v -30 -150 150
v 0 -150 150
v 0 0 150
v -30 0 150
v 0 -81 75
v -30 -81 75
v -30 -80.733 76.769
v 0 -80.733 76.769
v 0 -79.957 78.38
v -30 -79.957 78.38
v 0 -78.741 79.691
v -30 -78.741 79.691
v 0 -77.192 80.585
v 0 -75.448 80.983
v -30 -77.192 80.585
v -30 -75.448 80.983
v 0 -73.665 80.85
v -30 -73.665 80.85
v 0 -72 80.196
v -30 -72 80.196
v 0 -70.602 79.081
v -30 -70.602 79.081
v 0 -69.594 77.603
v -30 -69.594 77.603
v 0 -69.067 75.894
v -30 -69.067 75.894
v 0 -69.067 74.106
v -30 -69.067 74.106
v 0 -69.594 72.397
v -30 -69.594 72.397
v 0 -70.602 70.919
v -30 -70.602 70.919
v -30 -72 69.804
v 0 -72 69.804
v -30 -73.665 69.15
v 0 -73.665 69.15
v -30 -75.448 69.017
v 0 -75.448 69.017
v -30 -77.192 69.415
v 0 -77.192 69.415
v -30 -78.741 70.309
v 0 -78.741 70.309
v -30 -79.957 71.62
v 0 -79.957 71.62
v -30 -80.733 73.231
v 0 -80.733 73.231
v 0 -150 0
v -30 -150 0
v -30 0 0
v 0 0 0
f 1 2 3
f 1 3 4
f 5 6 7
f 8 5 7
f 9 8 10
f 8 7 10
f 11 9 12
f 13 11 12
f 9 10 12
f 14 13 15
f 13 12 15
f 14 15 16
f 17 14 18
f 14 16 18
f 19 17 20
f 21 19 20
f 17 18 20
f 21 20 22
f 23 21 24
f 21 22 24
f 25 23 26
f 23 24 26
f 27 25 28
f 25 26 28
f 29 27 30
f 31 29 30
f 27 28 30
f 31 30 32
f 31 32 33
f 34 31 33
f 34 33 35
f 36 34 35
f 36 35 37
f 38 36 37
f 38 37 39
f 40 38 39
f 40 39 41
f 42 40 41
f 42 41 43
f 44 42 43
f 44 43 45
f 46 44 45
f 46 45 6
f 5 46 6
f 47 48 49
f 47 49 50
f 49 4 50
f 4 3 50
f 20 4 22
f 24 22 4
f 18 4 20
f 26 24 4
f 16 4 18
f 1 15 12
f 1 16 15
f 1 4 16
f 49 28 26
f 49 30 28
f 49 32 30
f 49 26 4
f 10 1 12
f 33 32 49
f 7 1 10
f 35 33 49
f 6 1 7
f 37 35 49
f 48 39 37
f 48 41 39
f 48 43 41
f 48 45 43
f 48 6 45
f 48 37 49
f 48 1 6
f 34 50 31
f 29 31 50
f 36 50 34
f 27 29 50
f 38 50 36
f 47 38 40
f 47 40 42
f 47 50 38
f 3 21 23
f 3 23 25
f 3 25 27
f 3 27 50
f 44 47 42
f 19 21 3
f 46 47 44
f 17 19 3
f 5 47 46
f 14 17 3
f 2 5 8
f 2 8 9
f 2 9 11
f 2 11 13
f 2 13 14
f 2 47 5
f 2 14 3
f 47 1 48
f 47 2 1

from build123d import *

# Parameters (mm, degrees)
F0_W = 30
F0_H = 150
F4_D = 12


with BuildPart() as f2:
    # F2: sweep along a path in F1
    with BuildLine(Plane.YZ) as f2_path:
        Line((0, 0), (-150, 0))
    # F0 (on Front) → F2 (sweep)
    with BuildSketch(Plane.XZ):
        with Locations((-15, 75)):
            Rectangle(F0_W, F0_H)
    sweep(path=f2_path.line)

    # F4 (through all)
    with Locations(Plane.YZ):
        with Locations((-75, 75)):
            Hole(F4_D / 2)


solid = f2.part
